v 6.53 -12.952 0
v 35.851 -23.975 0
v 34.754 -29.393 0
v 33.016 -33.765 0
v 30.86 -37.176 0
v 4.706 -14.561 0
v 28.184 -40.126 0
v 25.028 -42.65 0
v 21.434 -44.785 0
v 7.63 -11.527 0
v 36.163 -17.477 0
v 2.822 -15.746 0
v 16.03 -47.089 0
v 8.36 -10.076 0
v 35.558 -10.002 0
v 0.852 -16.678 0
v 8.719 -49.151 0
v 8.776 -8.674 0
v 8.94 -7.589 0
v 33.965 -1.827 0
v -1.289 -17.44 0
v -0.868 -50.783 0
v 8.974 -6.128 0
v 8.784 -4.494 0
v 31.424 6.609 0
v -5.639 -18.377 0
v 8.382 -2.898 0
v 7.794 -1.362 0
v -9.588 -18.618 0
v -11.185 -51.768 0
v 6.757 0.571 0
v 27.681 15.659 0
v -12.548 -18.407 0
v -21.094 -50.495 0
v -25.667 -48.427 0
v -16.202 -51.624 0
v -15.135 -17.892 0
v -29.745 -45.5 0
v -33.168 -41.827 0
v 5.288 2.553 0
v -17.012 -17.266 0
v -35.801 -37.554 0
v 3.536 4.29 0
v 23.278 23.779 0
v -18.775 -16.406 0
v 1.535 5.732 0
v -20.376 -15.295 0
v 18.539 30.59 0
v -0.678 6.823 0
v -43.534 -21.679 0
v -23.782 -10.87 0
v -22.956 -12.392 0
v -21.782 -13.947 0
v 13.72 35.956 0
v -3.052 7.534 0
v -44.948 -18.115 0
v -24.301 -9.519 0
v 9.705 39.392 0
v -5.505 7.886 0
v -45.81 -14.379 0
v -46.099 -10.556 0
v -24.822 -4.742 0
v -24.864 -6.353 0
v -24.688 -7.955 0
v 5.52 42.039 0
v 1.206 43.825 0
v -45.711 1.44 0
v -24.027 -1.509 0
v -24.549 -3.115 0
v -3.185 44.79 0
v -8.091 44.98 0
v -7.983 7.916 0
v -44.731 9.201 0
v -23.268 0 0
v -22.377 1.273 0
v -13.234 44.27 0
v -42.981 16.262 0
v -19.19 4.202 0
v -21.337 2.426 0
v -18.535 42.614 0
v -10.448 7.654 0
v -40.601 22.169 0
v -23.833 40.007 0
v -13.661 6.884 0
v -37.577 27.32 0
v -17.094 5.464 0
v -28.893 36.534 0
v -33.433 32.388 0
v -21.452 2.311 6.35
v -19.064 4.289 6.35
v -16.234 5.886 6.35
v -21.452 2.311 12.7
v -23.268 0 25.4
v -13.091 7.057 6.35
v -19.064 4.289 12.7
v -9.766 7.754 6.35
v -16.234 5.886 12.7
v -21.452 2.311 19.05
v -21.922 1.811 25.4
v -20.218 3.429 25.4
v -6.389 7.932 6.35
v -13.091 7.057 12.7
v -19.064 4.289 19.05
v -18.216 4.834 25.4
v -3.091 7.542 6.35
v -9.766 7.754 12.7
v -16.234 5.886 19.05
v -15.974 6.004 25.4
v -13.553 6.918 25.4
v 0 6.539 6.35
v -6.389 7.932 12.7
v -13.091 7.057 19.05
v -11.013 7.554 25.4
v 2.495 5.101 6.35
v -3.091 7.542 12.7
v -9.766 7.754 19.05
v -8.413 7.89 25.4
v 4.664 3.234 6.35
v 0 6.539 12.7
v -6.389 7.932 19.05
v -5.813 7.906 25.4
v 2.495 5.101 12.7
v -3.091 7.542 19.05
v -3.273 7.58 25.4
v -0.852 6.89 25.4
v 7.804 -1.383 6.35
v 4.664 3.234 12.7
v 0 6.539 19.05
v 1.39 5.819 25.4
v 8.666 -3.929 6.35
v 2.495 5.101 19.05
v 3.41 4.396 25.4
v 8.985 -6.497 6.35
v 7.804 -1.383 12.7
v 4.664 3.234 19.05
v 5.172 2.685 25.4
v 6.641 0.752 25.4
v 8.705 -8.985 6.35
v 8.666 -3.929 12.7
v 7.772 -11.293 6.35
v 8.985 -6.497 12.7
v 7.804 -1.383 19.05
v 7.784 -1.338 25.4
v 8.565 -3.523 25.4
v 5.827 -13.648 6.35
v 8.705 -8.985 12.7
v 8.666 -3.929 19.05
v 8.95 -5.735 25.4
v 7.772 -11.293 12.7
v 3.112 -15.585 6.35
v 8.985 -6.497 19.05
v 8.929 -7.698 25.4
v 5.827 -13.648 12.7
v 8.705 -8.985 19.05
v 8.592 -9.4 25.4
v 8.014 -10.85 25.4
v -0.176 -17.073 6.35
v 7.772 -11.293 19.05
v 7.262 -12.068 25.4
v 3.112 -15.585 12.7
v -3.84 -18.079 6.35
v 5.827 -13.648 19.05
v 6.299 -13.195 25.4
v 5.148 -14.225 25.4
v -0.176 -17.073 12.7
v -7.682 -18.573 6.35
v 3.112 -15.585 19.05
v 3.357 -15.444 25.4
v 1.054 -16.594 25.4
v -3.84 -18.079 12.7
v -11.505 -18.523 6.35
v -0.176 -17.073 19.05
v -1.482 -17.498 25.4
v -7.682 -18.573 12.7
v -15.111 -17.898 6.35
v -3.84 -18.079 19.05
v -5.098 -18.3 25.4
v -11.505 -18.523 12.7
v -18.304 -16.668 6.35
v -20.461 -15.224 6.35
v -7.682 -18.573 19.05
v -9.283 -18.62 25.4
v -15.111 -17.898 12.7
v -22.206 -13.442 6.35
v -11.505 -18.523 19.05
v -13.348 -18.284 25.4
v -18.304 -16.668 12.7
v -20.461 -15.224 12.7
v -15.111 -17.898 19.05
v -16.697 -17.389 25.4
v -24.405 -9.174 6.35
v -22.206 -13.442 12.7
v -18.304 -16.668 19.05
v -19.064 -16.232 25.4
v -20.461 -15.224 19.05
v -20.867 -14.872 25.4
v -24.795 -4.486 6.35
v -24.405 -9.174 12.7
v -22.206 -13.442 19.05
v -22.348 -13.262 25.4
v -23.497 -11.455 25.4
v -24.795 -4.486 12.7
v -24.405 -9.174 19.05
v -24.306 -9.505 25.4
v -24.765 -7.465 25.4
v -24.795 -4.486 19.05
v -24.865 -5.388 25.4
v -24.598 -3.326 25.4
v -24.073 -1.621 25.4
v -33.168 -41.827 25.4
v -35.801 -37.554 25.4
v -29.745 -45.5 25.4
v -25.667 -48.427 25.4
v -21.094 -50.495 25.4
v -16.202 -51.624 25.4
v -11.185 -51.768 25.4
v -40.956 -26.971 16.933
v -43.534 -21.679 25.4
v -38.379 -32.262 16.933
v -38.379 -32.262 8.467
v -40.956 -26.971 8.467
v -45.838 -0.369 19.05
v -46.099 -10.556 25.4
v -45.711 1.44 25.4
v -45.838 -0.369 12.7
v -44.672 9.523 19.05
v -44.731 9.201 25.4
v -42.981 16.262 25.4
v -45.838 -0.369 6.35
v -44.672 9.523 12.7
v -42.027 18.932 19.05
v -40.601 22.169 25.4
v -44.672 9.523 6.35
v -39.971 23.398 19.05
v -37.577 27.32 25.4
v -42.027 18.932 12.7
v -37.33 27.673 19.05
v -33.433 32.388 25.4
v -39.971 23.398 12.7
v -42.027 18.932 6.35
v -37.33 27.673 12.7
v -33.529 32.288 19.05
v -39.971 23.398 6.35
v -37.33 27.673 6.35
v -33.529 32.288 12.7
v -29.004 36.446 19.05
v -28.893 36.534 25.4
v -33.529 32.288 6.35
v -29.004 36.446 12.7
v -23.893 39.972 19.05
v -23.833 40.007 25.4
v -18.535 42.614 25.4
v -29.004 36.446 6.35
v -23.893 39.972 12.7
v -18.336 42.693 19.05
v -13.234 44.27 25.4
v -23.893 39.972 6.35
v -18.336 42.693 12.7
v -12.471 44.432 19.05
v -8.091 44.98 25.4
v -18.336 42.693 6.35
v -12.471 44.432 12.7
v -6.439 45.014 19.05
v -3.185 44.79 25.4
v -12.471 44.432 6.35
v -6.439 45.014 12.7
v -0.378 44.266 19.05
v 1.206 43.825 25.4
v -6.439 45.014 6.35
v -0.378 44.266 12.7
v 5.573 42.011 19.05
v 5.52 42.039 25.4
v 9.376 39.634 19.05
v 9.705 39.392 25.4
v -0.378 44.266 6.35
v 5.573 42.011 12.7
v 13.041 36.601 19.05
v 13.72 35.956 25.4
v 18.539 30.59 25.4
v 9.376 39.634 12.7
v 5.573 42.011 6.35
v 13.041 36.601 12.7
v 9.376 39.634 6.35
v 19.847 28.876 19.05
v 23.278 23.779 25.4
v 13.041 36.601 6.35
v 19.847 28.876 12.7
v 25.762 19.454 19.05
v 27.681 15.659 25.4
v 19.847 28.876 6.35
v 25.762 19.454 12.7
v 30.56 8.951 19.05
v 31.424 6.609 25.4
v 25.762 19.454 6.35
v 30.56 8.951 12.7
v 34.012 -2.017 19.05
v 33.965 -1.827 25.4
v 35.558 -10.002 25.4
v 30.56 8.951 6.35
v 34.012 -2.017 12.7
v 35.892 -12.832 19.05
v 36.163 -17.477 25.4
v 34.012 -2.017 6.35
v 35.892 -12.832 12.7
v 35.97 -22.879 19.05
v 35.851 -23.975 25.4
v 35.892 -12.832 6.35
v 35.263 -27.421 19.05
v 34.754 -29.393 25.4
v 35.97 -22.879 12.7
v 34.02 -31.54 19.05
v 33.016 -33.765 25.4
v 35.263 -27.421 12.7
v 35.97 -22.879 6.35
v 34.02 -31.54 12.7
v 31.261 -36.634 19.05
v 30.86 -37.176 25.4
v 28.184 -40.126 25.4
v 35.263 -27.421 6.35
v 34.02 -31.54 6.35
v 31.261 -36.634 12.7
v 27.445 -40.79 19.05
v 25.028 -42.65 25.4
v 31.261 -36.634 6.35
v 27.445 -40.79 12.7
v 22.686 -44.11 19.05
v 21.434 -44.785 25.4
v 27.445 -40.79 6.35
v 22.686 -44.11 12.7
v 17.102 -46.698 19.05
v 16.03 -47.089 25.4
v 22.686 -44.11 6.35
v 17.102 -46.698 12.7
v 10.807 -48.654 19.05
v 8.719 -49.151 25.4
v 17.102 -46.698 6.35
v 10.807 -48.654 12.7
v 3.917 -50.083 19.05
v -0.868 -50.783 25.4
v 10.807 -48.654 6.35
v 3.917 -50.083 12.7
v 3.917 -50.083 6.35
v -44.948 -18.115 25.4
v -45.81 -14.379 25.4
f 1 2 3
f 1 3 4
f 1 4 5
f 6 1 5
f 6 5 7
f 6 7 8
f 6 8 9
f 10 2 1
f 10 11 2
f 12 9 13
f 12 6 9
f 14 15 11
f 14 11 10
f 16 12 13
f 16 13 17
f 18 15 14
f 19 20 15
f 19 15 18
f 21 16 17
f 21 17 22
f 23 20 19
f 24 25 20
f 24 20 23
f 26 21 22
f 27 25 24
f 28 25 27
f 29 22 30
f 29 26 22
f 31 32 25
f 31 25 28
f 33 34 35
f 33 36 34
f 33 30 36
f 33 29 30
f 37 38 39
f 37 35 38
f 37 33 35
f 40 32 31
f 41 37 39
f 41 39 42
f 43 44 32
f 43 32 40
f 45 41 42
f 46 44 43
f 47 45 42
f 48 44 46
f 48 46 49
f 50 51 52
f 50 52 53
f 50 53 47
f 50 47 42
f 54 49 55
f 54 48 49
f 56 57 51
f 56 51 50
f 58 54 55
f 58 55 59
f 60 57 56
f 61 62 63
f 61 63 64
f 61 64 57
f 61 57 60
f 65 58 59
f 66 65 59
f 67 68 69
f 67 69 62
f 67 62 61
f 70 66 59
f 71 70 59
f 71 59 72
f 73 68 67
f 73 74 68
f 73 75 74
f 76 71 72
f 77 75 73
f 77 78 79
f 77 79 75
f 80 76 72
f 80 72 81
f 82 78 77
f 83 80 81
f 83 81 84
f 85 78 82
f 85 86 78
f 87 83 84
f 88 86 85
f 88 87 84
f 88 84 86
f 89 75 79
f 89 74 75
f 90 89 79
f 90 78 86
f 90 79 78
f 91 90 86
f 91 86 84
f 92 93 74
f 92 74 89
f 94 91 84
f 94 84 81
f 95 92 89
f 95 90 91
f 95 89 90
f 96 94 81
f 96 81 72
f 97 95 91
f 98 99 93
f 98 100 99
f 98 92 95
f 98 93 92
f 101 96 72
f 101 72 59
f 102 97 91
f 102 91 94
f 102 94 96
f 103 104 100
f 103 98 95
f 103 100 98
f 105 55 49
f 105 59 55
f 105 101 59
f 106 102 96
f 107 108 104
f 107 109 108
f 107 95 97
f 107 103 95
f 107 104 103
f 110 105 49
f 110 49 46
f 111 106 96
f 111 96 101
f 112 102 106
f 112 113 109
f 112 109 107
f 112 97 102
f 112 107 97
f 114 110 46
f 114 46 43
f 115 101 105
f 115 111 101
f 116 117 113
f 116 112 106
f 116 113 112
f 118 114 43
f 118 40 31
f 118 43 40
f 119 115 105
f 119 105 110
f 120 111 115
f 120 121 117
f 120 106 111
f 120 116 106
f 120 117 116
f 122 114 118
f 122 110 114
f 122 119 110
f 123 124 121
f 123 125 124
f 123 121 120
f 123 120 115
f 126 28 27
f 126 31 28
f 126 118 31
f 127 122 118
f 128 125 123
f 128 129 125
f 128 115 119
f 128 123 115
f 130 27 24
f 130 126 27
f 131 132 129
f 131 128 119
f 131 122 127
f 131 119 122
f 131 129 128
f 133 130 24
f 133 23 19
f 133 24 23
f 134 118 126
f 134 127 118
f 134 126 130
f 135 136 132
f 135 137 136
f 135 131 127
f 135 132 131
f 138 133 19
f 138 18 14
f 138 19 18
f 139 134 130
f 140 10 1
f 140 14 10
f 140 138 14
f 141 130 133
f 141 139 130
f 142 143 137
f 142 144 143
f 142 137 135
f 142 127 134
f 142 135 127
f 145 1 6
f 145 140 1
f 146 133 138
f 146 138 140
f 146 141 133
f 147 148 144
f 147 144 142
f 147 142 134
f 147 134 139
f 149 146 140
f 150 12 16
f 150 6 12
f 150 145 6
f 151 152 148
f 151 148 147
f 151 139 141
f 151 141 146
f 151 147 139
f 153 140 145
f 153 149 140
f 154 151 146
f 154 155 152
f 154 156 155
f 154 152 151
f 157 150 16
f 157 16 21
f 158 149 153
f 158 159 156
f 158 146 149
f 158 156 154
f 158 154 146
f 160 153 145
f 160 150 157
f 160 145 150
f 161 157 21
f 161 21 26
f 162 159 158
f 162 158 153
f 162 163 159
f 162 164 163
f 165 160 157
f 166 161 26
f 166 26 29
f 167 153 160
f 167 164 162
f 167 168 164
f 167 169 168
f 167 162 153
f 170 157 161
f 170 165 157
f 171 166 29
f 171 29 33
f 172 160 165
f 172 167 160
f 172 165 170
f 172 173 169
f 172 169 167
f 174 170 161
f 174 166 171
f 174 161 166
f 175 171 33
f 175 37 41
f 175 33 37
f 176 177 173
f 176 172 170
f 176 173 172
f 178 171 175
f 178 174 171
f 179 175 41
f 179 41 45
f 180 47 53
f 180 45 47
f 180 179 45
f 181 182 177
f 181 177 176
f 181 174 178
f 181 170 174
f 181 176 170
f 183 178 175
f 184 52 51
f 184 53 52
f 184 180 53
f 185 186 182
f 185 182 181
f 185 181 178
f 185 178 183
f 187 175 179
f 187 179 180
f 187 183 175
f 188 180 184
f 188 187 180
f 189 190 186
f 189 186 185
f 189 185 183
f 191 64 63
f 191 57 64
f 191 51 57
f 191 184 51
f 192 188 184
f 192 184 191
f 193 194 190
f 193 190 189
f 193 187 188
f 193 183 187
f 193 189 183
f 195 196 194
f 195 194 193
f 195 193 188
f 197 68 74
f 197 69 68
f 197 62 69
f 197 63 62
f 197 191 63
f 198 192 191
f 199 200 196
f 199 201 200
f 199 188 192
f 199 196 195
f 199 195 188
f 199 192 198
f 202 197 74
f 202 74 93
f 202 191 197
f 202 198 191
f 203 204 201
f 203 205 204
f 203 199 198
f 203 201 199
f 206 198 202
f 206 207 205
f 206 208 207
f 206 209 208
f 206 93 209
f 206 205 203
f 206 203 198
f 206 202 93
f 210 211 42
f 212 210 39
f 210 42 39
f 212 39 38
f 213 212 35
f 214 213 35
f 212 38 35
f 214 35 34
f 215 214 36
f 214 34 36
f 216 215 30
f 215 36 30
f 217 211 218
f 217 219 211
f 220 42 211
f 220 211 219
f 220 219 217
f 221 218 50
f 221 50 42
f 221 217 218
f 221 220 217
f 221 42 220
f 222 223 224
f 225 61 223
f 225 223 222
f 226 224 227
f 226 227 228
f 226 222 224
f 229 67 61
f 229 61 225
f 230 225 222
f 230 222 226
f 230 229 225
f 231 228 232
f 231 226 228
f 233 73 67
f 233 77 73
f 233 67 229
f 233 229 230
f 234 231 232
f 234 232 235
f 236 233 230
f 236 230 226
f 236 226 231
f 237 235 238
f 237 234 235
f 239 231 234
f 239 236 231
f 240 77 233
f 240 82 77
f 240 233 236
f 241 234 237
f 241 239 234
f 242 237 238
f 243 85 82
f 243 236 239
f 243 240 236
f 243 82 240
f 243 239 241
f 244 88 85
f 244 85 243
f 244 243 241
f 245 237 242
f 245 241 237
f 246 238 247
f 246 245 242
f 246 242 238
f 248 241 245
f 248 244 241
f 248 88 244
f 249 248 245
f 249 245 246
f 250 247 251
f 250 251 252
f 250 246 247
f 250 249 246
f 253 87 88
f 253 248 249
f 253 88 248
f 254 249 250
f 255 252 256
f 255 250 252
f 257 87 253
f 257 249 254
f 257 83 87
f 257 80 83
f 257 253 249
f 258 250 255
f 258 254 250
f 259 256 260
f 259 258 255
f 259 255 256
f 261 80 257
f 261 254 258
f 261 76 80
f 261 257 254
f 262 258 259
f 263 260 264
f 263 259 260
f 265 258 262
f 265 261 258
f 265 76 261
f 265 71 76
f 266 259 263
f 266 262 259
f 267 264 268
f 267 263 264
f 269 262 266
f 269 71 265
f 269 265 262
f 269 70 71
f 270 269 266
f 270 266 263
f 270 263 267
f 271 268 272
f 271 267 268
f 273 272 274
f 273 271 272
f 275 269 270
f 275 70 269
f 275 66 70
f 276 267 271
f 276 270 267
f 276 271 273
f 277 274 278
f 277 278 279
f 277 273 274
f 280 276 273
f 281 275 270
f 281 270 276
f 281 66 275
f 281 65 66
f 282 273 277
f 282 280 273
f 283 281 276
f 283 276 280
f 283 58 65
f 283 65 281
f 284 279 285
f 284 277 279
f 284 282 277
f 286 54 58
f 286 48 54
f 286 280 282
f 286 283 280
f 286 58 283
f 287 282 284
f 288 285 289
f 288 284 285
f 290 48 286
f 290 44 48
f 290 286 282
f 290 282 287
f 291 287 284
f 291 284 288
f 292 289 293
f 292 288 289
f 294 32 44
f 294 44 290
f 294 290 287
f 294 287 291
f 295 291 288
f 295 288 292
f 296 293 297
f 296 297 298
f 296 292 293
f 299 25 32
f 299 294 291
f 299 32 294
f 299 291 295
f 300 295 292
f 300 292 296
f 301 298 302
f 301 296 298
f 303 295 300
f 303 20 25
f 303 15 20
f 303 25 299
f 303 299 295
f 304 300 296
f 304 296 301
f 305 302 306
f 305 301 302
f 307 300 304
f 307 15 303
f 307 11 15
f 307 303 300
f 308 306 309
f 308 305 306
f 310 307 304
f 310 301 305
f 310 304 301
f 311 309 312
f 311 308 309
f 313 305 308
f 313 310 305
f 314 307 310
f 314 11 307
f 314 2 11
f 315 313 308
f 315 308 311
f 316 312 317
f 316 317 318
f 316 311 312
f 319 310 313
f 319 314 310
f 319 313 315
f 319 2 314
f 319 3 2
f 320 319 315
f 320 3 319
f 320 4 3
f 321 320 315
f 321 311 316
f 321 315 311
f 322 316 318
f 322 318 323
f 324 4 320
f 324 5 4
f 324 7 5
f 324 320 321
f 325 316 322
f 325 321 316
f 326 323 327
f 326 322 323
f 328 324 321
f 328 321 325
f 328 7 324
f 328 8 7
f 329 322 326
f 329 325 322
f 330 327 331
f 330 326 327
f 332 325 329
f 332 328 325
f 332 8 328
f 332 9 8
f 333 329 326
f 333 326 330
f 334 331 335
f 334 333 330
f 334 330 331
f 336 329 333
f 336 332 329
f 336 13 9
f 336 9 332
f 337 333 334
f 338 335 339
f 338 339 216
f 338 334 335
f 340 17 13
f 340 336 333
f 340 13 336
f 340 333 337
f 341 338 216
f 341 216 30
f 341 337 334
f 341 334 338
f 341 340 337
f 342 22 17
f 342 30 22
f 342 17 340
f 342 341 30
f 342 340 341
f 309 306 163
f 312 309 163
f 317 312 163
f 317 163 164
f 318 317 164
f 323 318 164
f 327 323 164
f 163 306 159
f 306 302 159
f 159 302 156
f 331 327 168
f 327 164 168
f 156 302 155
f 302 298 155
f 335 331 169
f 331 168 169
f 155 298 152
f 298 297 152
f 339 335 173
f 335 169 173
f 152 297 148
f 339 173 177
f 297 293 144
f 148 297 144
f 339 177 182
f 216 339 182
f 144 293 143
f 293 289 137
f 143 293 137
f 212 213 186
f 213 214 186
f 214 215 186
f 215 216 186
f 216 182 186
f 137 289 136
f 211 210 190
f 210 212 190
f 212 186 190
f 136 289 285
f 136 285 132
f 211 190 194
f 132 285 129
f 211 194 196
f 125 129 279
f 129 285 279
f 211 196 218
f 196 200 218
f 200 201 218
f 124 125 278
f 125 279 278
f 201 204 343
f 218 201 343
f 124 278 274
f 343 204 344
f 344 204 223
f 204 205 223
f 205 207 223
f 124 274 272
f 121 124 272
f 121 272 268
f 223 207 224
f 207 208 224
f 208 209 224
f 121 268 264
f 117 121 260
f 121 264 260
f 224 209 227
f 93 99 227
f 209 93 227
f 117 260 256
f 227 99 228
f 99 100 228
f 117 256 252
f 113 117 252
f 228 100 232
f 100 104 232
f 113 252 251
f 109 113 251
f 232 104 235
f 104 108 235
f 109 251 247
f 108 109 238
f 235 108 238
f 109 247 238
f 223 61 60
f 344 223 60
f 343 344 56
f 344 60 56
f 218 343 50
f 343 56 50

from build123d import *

# Parameters (mm, degrees)
F1_DEPTH = 25.4
F3_DEPTH = 104.902


with BuildPart() as f1:
    # F0 (on Top) → F1 (new body)
    with BuildSketch(Plane.XY):
        with BuildLine():
            add(Edge.make_bspline(
                [(-46.0991912945, -10.5556205251), (-46.0990739821, 3.1401170204), (-44.2047112287, 31.9258238437), (14.0830478954, 63.0674394607), (53.6330898009, -41.1624333533), (9.8180946284, -50.2912053998), (-11.1846181743, -51.7680321244)],
                knots=[0.027765762, 0.027765762, 0.027765762, 0.027765762, 0.2204439576, 0.441423506, 0.7331940213, 0.9435786765, 0.9435786765, 0.9435786765, 0.9435786765], degree=3))
            ThreePointArc((-46.0991912945, -10.5556205251), (-45.4496236559, -16.2633855485), (-43.5340489335, -21.6792043382))
            add(Edge.make_bspline(
                [(-35.8011031231, -37.5539595869), (-38.3787517266, -32.262374504), (-40.95640033, -26.9707894211), (-43.5340489335, -21.6792043382)],
                knots=[16.7567995992, 16.7567995992, 16.7567995992, 16.7567995992, 34.4148375738, 34.4148375738, 34.4148375738, 34.4148375738], degree=3))
            ThreePointArc((-35.8011031231, -37.5539595869), (-25.6674104446, -48.4269659659), (-11.1846181743, -51.7680321244))
        make_face()
    extrude(amount=F1_DEPTH)

    # F2 (on face) → F3 (cut)
    with BuildSketch(Plane.XY.offset(25.4)):
        with BuildLine():
            add(Edge.make_bspline(
                [(-23.2676491141, 0), (-19.3057295103, 6.5657089804), (2.4302119089, 13.2204227766), (16.0169378818, -15.8120767234), (-22.0808563681, -22.9530178694), (-26.6284403137, -5.5695165896), (-23.2676491141, 0)],
                knots=[0, 0, 0, 0, 0.2635074208, 0.4999073959, 0.7764736519, 1, 1, 1, 1], degree=3))
        make_face()
    extrude(amount=-F3_DEPTH, mode=Mode.SUBTRACT)


solid = f1.part
